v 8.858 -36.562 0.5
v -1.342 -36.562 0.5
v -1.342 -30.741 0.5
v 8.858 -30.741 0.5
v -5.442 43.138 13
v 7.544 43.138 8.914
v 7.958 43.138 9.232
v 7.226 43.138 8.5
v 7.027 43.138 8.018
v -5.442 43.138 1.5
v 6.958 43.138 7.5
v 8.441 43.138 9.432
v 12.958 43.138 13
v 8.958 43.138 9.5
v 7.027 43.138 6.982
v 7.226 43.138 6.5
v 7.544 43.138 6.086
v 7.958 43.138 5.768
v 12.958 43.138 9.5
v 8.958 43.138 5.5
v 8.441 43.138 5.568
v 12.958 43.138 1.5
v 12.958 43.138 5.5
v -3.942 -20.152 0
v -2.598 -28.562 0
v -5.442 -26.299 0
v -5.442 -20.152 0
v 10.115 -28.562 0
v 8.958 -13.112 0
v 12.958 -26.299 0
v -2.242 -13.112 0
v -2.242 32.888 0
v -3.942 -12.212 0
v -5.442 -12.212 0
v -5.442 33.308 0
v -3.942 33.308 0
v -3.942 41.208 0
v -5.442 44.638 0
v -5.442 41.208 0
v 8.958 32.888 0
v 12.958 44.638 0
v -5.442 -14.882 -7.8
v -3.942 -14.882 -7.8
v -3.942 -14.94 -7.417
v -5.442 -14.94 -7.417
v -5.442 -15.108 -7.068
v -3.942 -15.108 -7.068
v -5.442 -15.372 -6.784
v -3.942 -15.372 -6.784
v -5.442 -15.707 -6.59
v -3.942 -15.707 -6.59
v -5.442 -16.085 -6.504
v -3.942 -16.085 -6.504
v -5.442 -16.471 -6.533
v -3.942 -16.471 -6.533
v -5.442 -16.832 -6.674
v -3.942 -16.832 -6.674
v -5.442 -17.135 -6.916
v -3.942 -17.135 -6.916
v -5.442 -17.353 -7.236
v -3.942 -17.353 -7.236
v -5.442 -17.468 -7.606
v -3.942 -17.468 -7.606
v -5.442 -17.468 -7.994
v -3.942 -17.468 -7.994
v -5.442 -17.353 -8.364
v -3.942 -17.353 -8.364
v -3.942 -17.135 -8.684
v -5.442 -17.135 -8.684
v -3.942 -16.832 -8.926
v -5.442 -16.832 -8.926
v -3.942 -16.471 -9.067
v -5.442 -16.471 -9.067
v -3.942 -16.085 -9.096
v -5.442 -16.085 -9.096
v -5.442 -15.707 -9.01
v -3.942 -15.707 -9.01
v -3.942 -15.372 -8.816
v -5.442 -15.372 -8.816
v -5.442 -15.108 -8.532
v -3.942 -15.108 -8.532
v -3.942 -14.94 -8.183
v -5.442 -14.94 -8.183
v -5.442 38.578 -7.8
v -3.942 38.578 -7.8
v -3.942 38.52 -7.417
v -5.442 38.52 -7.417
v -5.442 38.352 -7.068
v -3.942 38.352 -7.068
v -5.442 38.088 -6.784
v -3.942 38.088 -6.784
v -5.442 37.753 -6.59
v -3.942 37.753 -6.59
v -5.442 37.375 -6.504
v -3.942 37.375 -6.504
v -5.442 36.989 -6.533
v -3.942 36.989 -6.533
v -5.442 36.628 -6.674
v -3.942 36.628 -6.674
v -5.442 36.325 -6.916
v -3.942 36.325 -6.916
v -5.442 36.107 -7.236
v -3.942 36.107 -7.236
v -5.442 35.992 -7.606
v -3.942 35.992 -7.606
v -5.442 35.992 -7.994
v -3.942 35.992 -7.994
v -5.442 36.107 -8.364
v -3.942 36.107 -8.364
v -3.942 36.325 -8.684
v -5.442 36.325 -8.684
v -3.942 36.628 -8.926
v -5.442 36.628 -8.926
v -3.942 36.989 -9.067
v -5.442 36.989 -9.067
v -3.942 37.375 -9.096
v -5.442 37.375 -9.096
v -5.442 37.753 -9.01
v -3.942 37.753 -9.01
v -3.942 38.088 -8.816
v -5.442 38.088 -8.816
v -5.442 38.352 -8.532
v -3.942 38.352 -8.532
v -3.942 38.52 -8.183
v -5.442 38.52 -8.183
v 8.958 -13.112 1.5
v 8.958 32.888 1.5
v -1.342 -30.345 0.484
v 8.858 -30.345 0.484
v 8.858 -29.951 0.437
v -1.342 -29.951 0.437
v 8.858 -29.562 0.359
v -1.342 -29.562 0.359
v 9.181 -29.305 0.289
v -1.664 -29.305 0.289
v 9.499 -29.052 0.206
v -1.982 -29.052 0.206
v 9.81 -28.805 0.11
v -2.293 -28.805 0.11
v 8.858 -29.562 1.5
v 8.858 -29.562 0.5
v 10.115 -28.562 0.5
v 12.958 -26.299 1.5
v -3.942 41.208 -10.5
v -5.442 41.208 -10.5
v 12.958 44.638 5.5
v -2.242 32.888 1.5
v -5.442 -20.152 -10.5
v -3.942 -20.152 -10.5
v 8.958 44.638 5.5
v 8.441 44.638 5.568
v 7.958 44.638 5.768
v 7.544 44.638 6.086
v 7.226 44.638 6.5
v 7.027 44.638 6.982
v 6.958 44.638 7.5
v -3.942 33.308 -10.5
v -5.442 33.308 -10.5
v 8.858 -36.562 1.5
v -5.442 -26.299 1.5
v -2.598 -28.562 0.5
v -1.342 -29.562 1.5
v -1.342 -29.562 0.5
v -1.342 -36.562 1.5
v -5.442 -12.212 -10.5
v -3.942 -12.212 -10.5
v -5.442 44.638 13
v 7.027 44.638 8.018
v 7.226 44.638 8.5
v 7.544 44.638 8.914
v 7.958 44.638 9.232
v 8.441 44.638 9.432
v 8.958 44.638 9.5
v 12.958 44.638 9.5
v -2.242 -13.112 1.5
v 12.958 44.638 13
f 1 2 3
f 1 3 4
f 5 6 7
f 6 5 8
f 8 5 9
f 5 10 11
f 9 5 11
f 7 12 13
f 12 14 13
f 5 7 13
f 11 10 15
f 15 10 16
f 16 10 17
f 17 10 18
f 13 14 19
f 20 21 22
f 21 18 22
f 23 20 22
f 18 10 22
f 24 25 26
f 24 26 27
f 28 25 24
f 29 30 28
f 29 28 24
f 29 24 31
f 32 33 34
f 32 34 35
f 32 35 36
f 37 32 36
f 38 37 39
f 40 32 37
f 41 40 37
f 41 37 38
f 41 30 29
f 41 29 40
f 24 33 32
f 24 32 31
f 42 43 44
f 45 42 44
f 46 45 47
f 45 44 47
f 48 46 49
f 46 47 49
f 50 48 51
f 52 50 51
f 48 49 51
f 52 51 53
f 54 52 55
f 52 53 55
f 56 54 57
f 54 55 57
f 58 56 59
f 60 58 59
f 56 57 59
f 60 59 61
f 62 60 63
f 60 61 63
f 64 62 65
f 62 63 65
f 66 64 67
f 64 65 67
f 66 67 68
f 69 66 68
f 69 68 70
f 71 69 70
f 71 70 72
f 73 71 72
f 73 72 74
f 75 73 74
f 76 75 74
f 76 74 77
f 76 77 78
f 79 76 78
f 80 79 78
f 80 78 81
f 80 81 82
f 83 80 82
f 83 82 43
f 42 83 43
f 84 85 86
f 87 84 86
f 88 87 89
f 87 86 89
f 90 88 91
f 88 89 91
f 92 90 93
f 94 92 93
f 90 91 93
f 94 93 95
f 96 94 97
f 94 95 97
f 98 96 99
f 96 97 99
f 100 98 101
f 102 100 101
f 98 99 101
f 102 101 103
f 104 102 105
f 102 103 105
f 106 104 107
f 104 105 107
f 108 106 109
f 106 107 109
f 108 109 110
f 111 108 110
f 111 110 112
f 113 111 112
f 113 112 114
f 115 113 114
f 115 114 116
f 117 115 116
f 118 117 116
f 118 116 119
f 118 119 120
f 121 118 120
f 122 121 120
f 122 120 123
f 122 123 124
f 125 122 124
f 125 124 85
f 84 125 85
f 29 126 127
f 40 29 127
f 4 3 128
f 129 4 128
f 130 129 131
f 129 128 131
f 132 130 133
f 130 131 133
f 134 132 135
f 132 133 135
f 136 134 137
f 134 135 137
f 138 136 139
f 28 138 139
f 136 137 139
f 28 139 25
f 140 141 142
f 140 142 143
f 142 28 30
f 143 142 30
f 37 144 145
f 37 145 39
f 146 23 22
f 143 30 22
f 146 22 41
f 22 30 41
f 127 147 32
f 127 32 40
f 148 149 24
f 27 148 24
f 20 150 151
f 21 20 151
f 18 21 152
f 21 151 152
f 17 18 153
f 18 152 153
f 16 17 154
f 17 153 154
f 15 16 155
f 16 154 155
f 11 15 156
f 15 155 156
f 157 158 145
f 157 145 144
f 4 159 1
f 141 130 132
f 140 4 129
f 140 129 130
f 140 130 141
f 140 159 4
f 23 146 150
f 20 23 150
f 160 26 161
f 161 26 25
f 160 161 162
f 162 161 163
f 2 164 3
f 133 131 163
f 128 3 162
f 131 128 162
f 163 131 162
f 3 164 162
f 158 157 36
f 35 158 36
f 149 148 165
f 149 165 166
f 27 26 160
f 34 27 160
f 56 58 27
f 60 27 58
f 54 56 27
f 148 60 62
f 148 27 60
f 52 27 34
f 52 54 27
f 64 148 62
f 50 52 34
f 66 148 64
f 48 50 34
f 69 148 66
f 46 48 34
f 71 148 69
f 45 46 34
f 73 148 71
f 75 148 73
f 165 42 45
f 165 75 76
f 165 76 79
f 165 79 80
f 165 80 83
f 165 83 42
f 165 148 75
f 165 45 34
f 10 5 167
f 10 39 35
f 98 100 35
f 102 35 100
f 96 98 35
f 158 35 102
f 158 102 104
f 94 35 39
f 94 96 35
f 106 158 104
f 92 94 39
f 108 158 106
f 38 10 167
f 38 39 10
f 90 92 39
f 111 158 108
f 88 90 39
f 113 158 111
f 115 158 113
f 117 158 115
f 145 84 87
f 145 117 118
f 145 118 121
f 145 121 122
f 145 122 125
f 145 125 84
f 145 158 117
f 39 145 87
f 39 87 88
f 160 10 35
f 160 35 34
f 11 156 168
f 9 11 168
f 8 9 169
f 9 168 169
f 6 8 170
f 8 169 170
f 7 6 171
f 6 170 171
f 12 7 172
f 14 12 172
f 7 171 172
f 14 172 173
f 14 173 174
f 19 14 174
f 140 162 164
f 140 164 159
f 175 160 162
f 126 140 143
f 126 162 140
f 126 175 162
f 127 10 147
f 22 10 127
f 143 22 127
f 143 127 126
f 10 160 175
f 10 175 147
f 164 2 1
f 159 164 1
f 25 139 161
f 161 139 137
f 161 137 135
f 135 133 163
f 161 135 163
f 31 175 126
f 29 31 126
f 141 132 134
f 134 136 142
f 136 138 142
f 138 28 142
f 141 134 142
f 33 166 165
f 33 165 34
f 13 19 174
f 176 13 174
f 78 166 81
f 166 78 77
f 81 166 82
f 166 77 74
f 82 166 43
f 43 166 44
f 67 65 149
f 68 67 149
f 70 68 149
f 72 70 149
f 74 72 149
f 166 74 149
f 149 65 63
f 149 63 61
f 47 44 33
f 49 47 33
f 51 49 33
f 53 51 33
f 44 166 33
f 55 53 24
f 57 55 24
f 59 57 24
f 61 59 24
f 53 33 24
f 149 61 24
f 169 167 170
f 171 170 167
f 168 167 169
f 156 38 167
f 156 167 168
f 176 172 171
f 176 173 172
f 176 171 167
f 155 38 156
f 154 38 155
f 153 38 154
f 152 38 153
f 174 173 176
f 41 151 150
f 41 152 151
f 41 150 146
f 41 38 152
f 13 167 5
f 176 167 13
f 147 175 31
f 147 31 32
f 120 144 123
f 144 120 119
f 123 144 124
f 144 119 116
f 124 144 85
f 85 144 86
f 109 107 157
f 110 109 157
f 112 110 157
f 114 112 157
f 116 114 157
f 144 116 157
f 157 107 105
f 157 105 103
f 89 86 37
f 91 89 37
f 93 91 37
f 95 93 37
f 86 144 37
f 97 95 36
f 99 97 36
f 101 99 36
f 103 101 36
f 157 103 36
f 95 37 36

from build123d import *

# Parameters (mm, degrees)
F0_W          = 10.2
F0_H          = 7
F1_DEPTH      = 1.5
F2_W          = 11.2
F2_H          = 46
F3_DEPTH      = 25
F4_W          = 1.5
F4_H          = 70.9369339572
F5_DEPTH      = 10.5
F6_W          = 45.52
F6_H          = 10.5
F6_R          = 1.3
F6_W_2        = 3.43
F6_W_3        = 6.1469339572
F7_DEPTH      = 25
F9_DEPTH      = 0.5
F10_T4_DEPTH  = 23.6102213202
F10_T10_DEPTH = 23.6102213202
F11_W         = 18.4
F11_H         = 1.5
F12_DEPTH     = 11.5
F14_DEPTH     = 1.5


# Not quite as in the source:
# - a fillet or chamfer that OpenCascade refuses, or shapes differently, is made with other operations: its cross-section is extruded or revolved along the edge and cut away or added


with BuildPart() as f1:
    # F0 (on Top) → F1 (new body)
    with BuildSketch(Plane.XY):
        Polygon((12.9583973216, 44.6379526287), (-5.4416026784, 44.6379526287), (-5.4416026784, -26.2989813285), (-1.3416026784, -29.5620473713), (8.8583973216, -29.5620473713), (12.9583973216, -26.2989813285), align=None)
        with Locations((3.7583973216, -33.0620473713)):
            Rectangle(F0_W, F0_H)
    extrude(amount=F1_DEPTH)

    # F2 (on face) → F3 (cut)
    with BuildSketch(Plane.XY.offset(1.5)):
        with Locations((3.3583973216, 9.8879526287)):
            Rectangle(F2_W, F2_H)
    extrude(amount=-F3_DEPTH, mode=Mode.SUBTRACT)

    # F4 (on face) → F5 (join)
    with BuildSketch(Plane(origin=(0, 0, 0), x_dir=(1, 0, 0), z_dir=(0, 0, -1))):
        with Locations((-4.6916026784, -9.1694856501)):
            Rectangle(F4_W, F4_H)
    extrude(amount=F5_DEPTH)

    # F6 (on face) → F7 (cut)
    with BuildSketch(Plane.YZ.offset(-3.9416026784)):
        with Locations((10.5479526287, -5.25)):
            Rectangle(F6_W, F6_H)
        with Locations((-16.1820473713, -7.8)):
            Circle(F6_R)
        with Locations((37.2779526287, -7.8)):
            Circle(F6_R)
        with Locations((42.9229526287, -5.25)):
            Rectangle(F6_W_2, F6_H)
        with Locations((-23.2255143499, -5.25)):
            Rectangle(F6_W_3, F6_H)
    extrude(amount=-F7_DEPTH, mode=Mode.SUBTRACT)

    # F8 (on face) → F9 (cut)
    with BuildSketch(Plane(origin=(0, 0, 0), x_dir=(1, 0, 0), z_dir=(0, 0, -1))):
        Polygon((-1.3416026784, 29.5620473713), (-2.5980896591, 28.5620473713), (10.1148843023, 28.5620473713), (8.8583973216, 29.5620473713), (8.8583973216, 36.5620473713), (-1.3416026784, 36.5620473713), align=None)
    extrude(amount=-F9_DEPTH, mode=Mode.SUBTRACT)

    # F10: fillet of radius 5 on 1 edges, made by hand


with BuildPart() as f10_tool2:
    # F10_s3 → F10_t4 (new body)
    with BuildSketch(Plane.YZ.offset(-8.0467133385)):
        with BuildLine():
            ThreePointArc((-30.7414968431, 0.5), (-29.6234628544, 0.3733971724), (-28.5620473713, 0))
            Line((-28.5620473713, 0), (-28.5620473713, 0.5))
            Line((-28.5620473713, 0.5), (-30.7414968431, 0.5))
        make_face()
    extrude(amount=F10_T4_DEPTH)

    split(bisect_by=Plane.YZ.offset(8.8583973216), keep=Keep.BOTTOM)

    split(bisect_by=Plane(origin=(-14.9242028331, -18.7520665571, 0), x_dir=(0, 0, 1), z_dir=(0.6227225273, 0.7824427481, 0)), keep=Keep.TOP)


with BuildPart() as f1_1:
    add(f1.part)

    # F10_t1: union F10_tool2
    add(f10_tool2.part)


with BuildPart() as f10_tool8:
    # F10_s9 → F10_t10 (new body)
    with BuildSketch(Plane.YZ.offset(-8.0467133385)):
        with BuildLine():
            ThreePointArc((-30.7414968431, 0.5), (-29.6234628544, 0.3733971724), (-28.5620473713, 0))
            Line((-28.5620473713, 0), (-28.5620473713, 0.5))
            Line((-28.5620473713, 0.5), (-30.7414968431, 0.5))
        make_face()
    extrude(amount=F10_T10_DEPTH)

    split(bisect_by=Plane(origin=(17.8390906107, -22.4145850999, 0), x_dir=(0, 0, 1), z_dir=(-0.6227225273, 0.7824427481, 0)), keep=Keep.TOP)

    split(bisect_by=Plane.YZ.offset(-1.3416026784), keep=Keep.TOP)


with BuildPart() as f1_2:
    add(f1_1.part)

    # F10_t7: union F10_tool8
    add(f10_tool8.part)

    # F11 (on face) → F12 (join)
    with BuildSketch(Plane.XY.offset(1.5)):
        with Locations((3.7583973216, 43.8879526287)):
            Rectangle(F11_W, F11_H)
    extrude(amount=F12_DEPTH)

    # F13 (on face) → F14 (cut, through all)
    with BuildSketch(Plane(origin=(0, 44.6379526287, 0), x_dir=(-1, 0, 0), z_dir=(0, 1, 0))):
        with BuildLine():
            ThreePointArc((-6.9583973216, 7.5), (-7.5441837593, 8.9142135624), (-8.9583973216, 9.5))
            ThreePointArc((-8.9583973216, 9.5), (-10.9583973216, 7.5), (-8.9583973216, 5.5))
            ThreePointArc((-8.9583973216, 5.5), (-7.5441837593, 6.0857864376), (-6.9583973216, 7.5))
        make_face()
        with BuildLine():
            Line((-8.9583973216, 9.5), (-12.9583973216, 9.5))
            Line((-12.9583973216, 9.5), (-12.9583973216, 5.5))
            Line((-12.9583973216, 5.5), (-8.9583973216, 5.5))
            ThreePointArc((-8.9583973216, 5.5), (-10.9583973216, 7.5), (-8.9583973216, 9.5))
        make_face()
    extrude(amount=-F14_DEPTH, mode=Mode.SUBTRACT)


solid = f1_2.part
